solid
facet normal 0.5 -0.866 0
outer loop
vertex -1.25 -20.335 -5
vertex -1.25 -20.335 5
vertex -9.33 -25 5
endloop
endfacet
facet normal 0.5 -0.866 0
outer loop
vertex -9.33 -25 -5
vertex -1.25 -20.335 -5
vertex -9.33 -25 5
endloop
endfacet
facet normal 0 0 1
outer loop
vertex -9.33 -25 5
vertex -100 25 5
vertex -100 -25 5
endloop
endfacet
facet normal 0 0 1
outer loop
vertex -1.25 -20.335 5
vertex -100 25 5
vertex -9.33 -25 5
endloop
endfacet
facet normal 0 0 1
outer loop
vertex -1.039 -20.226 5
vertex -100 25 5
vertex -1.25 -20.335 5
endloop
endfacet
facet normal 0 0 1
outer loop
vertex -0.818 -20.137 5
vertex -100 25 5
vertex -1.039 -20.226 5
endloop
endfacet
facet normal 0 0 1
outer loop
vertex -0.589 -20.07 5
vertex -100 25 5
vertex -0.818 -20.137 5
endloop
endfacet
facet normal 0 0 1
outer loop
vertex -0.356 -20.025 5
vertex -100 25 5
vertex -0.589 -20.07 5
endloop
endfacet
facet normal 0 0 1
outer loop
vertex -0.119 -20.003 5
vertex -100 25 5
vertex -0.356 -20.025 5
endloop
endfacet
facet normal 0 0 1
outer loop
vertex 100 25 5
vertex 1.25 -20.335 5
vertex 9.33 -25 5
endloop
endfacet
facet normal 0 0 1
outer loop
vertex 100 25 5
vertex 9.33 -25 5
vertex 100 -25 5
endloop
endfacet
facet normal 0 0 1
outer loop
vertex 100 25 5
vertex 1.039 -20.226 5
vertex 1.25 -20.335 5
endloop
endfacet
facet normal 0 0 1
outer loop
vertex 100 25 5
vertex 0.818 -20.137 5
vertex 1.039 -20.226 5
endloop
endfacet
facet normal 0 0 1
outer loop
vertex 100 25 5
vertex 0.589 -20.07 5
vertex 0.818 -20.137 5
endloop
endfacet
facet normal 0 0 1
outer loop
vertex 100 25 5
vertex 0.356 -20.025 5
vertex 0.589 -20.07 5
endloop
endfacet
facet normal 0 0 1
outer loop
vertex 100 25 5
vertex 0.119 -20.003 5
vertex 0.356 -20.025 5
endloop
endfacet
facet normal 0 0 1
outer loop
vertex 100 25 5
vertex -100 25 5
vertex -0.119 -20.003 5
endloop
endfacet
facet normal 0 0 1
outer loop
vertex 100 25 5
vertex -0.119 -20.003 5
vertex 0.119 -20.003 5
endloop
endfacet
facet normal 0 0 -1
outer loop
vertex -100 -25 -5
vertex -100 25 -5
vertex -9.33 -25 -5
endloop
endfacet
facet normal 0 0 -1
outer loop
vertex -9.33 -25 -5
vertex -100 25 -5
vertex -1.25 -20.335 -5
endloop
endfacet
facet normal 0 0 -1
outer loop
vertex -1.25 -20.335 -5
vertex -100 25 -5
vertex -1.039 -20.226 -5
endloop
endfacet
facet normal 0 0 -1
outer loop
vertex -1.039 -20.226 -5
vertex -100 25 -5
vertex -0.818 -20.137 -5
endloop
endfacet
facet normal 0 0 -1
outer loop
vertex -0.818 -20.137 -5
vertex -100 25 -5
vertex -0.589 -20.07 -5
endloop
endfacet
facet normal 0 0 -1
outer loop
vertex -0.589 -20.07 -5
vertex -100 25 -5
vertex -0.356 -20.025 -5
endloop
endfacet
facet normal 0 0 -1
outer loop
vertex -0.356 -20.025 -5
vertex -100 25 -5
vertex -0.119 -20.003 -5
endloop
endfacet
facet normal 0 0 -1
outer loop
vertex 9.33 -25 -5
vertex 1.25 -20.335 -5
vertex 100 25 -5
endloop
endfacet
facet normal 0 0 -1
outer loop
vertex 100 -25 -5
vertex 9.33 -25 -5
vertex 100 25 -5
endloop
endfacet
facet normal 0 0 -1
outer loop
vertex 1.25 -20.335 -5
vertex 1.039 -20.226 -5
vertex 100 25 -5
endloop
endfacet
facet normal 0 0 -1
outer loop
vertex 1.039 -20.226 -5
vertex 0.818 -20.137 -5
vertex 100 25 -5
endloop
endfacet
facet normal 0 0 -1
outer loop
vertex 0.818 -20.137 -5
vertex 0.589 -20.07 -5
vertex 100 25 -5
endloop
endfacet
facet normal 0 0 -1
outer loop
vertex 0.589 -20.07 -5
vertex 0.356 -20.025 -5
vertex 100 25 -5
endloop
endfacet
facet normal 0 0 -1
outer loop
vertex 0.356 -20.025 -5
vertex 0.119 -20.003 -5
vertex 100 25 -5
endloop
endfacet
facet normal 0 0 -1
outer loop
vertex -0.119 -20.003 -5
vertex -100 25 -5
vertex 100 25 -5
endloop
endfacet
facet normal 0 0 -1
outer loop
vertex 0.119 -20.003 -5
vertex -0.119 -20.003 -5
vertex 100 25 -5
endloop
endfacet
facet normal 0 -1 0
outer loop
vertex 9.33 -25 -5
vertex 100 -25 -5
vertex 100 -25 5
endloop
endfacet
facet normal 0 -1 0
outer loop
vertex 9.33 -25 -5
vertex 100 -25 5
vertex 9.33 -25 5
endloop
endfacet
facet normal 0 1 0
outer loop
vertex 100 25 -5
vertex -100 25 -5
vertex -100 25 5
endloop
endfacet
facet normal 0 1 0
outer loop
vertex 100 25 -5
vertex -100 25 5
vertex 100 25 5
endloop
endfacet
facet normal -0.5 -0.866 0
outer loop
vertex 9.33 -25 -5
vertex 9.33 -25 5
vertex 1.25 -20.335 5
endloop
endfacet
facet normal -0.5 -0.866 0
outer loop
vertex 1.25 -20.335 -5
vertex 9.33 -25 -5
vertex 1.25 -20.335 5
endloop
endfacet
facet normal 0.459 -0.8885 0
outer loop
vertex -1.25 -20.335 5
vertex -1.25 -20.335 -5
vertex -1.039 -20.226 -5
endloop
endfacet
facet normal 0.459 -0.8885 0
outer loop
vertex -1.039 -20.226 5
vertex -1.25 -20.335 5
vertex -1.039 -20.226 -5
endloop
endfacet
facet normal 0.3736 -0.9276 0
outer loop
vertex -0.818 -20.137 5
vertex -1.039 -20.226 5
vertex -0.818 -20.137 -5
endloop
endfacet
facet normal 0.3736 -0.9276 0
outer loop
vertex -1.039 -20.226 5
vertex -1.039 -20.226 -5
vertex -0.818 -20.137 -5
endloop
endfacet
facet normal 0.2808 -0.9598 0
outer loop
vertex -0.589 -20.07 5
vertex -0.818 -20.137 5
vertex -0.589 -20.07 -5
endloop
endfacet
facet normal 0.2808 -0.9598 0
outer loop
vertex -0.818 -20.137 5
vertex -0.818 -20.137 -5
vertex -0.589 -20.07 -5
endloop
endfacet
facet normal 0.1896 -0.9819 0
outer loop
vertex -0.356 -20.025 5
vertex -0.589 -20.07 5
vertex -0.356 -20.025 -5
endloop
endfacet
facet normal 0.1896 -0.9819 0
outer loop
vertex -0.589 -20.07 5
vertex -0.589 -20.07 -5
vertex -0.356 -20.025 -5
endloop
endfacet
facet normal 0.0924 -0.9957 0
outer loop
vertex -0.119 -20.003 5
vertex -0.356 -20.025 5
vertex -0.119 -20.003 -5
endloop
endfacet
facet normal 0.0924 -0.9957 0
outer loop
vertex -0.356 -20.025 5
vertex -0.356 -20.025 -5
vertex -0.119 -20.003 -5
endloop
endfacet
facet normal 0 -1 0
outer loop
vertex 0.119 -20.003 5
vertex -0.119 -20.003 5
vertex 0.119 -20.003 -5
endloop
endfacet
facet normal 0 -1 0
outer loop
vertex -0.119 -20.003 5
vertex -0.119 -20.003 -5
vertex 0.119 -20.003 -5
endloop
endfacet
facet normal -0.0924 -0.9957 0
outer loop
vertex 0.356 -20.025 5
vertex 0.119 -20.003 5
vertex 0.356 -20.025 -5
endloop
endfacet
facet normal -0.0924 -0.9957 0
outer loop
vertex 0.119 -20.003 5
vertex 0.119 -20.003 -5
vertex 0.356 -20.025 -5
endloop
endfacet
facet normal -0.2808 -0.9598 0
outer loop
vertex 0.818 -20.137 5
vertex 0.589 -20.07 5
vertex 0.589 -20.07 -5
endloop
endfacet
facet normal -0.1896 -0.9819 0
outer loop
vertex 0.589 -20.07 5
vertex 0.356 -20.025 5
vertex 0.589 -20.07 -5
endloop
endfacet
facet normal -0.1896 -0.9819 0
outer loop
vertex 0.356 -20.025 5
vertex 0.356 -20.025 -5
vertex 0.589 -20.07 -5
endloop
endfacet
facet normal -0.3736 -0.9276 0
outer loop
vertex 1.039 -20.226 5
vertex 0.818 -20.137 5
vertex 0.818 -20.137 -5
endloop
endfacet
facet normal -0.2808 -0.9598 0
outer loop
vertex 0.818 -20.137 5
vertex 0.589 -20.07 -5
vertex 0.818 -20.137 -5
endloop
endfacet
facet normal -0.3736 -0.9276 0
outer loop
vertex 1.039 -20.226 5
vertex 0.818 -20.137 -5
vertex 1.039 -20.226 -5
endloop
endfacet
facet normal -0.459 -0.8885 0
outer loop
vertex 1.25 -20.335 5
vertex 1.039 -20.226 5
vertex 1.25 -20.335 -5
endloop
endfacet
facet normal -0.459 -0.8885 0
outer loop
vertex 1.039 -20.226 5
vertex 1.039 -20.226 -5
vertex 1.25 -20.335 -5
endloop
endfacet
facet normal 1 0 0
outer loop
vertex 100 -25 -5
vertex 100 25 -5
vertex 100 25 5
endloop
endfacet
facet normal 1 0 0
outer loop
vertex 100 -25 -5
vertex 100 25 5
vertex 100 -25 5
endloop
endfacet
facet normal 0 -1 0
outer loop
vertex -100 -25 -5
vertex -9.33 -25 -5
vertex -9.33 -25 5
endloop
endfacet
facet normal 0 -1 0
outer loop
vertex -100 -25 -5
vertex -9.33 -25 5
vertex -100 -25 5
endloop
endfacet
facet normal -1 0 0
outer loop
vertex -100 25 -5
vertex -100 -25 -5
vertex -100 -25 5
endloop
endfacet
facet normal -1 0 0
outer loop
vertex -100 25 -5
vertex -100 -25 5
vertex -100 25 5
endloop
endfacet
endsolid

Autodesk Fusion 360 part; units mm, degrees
sketch "Sketch1" plane through (0, 0, 0) normal (0, 0, 1) x (1, 0, 0)
  line L0 (-100, 0) -> (-100, 25)
  line L1 (-100, 25) -> (100, 25)
  line L2 (100, 25) -> (100, 0)
  line L3 (100, 0) -> (100, -25)
  line L4 (100, -25) -> (9.3301, -25)
  line L5 (9.3301, -25) -> (1.25, -20.3349)
  arc A0 (1.25, -20.3349) -> (-1.25, -20.3349) centre (0, -22.5) ccw
  line L6 (-1.25, -20.3349) -> (-9.3301, -25)
  line L7 (-9.3301, -25) -> (-100, -25)
  line L8 (-100, -25) -> (-100, 0)
  line L9 (-100, 0) -> (100, 0) construction
  line L10 (0, 0) -> (0, -22.5) construction
  line L11 (-100, -20) -> (100, -20) construction
  dimension "Total_Width" = 200
  dimension "Total_Height" = 50
  dimension "Notch_Radius" = 2.5
  dimension "Notch_Theta" = 120
  dimension "Notch_Height" = 5
extrude "Extrude1" add sketch "Sketch1" along normal mid plane 10
equation "Thickness = 1 cm"
